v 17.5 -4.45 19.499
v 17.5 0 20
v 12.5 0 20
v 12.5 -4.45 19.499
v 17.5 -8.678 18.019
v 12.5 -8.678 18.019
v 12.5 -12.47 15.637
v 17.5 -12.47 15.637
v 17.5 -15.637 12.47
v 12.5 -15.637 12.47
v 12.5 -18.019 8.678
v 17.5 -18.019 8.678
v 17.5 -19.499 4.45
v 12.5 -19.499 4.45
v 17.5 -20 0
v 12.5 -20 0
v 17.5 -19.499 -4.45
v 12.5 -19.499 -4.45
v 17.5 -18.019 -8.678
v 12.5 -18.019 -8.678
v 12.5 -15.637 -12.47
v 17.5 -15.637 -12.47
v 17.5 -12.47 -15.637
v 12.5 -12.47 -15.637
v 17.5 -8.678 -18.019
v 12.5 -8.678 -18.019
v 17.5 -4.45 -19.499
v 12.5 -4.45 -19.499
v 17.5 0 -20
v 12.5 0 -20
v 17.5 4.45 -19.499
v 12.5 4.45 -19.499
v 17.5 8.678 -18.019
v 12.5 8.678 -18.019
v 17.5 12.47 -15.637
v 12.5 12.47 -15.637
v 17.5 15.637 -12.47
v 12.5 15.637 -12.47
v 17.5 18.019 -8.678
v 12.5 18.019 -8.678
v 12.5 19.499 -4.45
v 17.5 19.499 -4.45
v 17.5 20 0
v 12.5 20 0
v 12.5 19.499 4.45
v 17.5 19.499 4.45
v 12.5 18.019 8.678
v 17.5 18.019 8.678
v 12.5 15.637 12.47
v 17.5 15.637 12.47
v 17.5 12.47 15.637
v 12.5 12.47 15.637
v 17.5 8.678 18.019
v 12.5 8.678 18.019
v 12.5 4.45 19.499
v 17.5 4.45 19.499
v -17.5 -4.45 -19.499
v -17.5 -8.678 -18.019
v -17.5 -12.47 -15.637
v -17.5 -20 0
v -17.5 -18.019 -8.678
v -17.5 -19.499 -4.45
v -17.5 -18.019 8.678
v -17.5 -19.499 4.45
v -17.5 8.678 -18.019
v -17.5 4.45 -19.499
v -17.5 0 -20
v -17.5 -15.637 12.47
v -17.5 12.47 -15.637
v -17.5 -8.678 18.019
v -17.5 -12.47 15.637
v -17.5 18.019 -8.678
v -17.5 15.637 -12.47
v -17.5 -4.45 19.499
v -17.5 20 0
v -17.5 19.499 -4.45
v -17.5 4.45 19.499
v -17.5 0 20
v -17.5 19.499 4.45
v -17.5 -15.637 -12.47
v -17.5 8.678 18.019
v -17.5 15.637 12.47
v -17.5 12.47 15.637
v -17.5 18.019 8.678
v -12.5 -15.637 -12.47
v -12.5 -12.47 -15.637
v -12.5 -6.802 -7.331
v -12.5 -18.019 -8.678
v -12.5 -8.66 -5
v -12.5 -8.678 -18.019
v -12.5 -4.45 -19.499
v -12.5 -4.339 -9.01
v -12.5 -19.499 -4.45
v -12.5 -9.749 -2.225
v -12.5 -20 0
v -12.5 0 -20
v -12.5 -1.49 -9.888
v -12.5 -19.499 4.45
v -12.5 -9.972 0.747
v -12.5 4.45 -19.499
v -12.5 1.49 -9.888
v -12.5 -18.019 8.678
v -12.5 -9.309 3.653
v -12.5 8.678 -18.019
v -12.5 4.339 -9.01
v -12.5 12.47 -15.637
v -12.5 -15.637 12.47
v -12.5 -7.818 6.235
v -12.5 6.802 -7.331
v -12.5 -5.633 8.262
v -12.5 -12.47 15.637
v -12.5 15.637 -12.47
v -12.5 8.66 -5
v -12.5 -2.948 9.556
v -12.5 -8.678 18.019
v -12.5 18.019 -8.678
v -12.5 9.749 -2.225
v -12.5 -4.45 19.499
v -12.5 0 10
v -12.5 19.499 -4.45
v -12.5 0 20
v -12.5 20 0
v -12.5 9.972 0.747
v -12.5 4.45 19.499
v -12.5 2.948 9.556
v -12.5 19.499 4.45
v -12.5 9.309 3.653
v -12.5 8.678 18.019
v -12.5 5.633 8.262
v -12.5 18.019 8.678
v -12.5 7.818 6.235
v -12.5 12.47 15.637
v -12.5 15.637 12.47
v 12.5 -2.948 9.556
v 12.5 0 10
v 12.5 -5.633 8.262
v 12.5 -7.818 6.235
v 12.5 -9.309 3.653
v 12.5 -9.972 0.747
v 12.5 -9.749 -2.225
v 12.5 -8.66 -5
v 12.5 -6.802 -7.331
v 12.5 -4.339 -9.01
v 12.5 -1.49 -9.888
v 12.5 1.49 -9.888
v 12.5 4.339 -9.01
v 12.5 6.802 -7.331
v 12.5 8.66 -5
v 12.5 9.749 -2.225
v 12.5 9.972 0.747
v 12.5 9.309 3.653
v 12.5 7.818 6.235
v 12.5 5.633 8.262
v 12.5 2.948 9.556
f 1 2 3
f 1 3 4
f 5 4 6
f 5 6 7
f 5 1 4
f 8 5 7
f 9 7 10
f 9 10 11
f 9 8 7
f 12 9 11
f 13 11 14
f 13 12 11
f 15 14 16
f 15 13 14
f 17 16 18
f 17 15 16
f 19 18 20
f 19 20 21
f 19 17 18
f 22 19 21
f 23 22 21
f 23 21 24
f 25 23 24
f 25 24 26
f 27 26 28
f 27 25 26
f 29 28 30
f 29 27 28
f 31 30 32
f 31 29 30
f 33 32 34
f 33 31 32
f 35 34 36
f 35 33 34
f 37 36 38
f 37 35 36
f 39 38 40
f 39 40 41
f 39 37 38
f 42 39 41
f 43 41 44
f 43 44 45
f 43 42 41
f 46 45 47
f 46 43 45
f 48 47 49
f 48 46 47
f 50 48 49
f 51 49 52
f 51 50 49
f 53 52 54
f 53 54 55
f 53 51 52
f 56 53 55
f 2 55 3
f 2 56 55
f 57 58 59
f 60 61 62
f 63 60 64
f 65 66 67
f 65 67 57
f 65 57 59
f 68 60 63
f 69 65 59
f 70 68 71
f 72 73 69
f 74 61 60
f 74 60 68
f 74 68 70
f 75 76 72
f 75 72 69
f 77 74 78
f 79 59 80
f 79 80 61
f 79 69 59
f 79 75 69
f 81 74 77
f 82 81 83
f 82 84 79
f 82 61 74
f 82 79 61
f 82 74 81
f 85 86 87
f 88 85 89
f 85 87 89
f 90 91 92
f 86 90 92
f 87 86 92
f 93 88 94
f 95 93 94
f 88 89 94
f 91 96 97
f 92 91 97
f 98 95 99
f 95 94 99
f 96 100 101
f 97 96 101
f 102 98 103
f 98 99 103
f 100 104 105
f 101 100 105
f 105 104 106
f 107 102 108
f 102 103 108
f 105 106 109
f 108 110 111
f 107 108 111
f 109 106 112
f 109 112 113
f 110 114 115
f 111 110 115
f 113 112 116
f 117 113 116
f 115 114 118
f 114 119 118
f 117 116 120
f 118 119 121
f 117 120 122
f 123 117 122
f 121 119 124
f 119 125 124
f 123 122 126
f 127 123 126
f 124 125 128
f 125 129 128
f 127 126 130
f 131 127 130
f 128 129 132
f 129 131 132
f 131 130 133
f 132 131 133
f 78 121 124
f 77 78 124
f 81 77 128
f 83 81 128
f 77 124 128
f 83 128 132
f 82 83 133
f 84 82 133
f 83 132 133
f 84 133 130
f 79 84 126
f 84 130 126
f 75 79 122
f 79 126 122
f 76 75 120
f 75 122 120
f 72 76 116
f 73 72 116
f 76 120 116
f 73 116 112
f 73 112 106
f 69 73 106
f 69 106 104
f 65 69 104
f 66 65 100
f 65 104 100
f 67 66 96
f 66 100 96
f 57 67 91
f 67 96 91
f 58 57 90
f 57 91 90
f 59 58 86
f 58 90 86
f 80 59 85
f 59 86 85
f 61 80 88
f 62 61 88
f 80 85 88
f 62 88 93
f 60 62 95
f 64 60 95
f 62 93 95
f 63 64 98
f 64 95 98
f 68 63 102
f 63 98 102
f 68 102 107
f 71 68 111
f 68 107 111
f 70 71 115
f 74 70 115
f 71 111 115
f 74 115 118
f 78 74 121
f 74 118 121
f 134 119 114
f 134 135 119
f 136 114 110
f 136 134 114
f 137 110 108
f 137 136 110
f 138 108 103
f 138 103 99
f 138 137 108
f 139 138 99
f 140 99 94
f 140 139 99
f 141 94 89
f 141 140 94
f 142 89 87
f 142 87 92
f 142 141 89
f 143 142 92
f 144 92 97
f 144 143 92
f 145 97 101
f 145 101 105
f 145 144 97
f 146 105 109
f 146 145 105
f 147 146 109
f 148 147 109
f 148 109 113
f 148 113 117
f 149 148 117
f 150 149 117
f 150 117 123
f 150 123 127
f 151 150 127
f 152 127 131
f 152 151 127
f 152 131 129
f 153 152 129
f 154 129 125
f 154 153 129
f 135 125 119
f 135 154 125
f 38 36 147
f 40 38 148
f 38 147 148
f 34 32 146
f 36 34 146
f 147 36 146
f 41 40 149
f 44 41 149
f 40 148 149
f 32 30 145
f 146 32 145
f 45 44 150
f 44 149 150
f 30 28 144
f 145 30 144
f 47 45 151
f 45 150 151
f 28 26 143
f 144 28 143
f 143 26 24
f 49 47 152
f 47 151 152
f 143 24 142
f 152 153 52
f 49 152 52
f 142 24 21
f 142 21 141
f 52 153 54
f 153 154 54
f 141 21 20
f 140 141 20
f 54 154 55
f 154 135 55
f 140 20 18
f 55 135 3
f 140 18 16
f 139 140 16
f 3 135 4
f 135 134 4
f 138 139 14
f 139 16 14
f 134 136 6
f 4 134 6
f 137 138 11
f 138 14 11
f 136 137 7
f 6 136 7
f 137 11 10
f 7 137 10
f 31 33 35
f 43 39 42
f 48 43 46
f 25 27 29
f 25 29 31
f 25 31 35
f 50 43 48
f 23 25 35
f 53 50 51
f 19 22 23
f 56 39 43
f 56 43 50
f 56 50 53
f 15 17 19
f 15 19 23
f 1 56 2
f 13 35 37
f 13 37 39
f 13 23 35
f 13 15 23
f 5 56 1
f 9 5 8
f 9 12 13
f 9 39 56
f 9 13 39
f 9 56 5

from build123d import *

# Parameters (mm, degrees)
SKETCH1_W           = 25
SKETCH1_H           = 10
SKETCH2_R           = 20
BOSS_EXTRUDE1_DEPTH = 5
BOSS_EXTRUDE2_START = 5
SKETCH3_R           = 20
BOSS_EXTRUDE2_DEPTH = 5


with BuildPart() as part:
    # Sketch1 → Revolve1 (revolve)
    with BuildSketch(Plane.XY, mode=Mode.PRIVATE) as revolve1_sk:
        with Locations((0, 5)):
            Rectangle(SKETCH1_W, SKETCH1_H)
    revolve(revolve1_sk.sketch.rotate(Axis((0, 0, 0), (1, 0, 0)), 90), axis=Axis((0, 0, 0), (1, 0, 0)))

    # Sketch2 → Boss-Extrude1 (add)
    with BuildSketch(Plane.ZY.offset(12.5)):
        Circle(SKETCH2_R)
    extrude(amount=BOSS_EXTRUDE1_DEPTH)

    # Sketch3 → Boss-Extrude2 (add)
    with BuildSketch(Plane(origin=(12.5, 0, 0), x_dir=(0, 0, -1), z_dir=(1, 0, 0)).offset(BOSS_EXTRUDE2_START)):
        with Locations(Location((0, 0, 0), (0, 0, 180))):
            Circle(SKETCH3_R)
    extrude(amount=-BOSS_EXTRUDE2_DEPTH)


solid = part.part
